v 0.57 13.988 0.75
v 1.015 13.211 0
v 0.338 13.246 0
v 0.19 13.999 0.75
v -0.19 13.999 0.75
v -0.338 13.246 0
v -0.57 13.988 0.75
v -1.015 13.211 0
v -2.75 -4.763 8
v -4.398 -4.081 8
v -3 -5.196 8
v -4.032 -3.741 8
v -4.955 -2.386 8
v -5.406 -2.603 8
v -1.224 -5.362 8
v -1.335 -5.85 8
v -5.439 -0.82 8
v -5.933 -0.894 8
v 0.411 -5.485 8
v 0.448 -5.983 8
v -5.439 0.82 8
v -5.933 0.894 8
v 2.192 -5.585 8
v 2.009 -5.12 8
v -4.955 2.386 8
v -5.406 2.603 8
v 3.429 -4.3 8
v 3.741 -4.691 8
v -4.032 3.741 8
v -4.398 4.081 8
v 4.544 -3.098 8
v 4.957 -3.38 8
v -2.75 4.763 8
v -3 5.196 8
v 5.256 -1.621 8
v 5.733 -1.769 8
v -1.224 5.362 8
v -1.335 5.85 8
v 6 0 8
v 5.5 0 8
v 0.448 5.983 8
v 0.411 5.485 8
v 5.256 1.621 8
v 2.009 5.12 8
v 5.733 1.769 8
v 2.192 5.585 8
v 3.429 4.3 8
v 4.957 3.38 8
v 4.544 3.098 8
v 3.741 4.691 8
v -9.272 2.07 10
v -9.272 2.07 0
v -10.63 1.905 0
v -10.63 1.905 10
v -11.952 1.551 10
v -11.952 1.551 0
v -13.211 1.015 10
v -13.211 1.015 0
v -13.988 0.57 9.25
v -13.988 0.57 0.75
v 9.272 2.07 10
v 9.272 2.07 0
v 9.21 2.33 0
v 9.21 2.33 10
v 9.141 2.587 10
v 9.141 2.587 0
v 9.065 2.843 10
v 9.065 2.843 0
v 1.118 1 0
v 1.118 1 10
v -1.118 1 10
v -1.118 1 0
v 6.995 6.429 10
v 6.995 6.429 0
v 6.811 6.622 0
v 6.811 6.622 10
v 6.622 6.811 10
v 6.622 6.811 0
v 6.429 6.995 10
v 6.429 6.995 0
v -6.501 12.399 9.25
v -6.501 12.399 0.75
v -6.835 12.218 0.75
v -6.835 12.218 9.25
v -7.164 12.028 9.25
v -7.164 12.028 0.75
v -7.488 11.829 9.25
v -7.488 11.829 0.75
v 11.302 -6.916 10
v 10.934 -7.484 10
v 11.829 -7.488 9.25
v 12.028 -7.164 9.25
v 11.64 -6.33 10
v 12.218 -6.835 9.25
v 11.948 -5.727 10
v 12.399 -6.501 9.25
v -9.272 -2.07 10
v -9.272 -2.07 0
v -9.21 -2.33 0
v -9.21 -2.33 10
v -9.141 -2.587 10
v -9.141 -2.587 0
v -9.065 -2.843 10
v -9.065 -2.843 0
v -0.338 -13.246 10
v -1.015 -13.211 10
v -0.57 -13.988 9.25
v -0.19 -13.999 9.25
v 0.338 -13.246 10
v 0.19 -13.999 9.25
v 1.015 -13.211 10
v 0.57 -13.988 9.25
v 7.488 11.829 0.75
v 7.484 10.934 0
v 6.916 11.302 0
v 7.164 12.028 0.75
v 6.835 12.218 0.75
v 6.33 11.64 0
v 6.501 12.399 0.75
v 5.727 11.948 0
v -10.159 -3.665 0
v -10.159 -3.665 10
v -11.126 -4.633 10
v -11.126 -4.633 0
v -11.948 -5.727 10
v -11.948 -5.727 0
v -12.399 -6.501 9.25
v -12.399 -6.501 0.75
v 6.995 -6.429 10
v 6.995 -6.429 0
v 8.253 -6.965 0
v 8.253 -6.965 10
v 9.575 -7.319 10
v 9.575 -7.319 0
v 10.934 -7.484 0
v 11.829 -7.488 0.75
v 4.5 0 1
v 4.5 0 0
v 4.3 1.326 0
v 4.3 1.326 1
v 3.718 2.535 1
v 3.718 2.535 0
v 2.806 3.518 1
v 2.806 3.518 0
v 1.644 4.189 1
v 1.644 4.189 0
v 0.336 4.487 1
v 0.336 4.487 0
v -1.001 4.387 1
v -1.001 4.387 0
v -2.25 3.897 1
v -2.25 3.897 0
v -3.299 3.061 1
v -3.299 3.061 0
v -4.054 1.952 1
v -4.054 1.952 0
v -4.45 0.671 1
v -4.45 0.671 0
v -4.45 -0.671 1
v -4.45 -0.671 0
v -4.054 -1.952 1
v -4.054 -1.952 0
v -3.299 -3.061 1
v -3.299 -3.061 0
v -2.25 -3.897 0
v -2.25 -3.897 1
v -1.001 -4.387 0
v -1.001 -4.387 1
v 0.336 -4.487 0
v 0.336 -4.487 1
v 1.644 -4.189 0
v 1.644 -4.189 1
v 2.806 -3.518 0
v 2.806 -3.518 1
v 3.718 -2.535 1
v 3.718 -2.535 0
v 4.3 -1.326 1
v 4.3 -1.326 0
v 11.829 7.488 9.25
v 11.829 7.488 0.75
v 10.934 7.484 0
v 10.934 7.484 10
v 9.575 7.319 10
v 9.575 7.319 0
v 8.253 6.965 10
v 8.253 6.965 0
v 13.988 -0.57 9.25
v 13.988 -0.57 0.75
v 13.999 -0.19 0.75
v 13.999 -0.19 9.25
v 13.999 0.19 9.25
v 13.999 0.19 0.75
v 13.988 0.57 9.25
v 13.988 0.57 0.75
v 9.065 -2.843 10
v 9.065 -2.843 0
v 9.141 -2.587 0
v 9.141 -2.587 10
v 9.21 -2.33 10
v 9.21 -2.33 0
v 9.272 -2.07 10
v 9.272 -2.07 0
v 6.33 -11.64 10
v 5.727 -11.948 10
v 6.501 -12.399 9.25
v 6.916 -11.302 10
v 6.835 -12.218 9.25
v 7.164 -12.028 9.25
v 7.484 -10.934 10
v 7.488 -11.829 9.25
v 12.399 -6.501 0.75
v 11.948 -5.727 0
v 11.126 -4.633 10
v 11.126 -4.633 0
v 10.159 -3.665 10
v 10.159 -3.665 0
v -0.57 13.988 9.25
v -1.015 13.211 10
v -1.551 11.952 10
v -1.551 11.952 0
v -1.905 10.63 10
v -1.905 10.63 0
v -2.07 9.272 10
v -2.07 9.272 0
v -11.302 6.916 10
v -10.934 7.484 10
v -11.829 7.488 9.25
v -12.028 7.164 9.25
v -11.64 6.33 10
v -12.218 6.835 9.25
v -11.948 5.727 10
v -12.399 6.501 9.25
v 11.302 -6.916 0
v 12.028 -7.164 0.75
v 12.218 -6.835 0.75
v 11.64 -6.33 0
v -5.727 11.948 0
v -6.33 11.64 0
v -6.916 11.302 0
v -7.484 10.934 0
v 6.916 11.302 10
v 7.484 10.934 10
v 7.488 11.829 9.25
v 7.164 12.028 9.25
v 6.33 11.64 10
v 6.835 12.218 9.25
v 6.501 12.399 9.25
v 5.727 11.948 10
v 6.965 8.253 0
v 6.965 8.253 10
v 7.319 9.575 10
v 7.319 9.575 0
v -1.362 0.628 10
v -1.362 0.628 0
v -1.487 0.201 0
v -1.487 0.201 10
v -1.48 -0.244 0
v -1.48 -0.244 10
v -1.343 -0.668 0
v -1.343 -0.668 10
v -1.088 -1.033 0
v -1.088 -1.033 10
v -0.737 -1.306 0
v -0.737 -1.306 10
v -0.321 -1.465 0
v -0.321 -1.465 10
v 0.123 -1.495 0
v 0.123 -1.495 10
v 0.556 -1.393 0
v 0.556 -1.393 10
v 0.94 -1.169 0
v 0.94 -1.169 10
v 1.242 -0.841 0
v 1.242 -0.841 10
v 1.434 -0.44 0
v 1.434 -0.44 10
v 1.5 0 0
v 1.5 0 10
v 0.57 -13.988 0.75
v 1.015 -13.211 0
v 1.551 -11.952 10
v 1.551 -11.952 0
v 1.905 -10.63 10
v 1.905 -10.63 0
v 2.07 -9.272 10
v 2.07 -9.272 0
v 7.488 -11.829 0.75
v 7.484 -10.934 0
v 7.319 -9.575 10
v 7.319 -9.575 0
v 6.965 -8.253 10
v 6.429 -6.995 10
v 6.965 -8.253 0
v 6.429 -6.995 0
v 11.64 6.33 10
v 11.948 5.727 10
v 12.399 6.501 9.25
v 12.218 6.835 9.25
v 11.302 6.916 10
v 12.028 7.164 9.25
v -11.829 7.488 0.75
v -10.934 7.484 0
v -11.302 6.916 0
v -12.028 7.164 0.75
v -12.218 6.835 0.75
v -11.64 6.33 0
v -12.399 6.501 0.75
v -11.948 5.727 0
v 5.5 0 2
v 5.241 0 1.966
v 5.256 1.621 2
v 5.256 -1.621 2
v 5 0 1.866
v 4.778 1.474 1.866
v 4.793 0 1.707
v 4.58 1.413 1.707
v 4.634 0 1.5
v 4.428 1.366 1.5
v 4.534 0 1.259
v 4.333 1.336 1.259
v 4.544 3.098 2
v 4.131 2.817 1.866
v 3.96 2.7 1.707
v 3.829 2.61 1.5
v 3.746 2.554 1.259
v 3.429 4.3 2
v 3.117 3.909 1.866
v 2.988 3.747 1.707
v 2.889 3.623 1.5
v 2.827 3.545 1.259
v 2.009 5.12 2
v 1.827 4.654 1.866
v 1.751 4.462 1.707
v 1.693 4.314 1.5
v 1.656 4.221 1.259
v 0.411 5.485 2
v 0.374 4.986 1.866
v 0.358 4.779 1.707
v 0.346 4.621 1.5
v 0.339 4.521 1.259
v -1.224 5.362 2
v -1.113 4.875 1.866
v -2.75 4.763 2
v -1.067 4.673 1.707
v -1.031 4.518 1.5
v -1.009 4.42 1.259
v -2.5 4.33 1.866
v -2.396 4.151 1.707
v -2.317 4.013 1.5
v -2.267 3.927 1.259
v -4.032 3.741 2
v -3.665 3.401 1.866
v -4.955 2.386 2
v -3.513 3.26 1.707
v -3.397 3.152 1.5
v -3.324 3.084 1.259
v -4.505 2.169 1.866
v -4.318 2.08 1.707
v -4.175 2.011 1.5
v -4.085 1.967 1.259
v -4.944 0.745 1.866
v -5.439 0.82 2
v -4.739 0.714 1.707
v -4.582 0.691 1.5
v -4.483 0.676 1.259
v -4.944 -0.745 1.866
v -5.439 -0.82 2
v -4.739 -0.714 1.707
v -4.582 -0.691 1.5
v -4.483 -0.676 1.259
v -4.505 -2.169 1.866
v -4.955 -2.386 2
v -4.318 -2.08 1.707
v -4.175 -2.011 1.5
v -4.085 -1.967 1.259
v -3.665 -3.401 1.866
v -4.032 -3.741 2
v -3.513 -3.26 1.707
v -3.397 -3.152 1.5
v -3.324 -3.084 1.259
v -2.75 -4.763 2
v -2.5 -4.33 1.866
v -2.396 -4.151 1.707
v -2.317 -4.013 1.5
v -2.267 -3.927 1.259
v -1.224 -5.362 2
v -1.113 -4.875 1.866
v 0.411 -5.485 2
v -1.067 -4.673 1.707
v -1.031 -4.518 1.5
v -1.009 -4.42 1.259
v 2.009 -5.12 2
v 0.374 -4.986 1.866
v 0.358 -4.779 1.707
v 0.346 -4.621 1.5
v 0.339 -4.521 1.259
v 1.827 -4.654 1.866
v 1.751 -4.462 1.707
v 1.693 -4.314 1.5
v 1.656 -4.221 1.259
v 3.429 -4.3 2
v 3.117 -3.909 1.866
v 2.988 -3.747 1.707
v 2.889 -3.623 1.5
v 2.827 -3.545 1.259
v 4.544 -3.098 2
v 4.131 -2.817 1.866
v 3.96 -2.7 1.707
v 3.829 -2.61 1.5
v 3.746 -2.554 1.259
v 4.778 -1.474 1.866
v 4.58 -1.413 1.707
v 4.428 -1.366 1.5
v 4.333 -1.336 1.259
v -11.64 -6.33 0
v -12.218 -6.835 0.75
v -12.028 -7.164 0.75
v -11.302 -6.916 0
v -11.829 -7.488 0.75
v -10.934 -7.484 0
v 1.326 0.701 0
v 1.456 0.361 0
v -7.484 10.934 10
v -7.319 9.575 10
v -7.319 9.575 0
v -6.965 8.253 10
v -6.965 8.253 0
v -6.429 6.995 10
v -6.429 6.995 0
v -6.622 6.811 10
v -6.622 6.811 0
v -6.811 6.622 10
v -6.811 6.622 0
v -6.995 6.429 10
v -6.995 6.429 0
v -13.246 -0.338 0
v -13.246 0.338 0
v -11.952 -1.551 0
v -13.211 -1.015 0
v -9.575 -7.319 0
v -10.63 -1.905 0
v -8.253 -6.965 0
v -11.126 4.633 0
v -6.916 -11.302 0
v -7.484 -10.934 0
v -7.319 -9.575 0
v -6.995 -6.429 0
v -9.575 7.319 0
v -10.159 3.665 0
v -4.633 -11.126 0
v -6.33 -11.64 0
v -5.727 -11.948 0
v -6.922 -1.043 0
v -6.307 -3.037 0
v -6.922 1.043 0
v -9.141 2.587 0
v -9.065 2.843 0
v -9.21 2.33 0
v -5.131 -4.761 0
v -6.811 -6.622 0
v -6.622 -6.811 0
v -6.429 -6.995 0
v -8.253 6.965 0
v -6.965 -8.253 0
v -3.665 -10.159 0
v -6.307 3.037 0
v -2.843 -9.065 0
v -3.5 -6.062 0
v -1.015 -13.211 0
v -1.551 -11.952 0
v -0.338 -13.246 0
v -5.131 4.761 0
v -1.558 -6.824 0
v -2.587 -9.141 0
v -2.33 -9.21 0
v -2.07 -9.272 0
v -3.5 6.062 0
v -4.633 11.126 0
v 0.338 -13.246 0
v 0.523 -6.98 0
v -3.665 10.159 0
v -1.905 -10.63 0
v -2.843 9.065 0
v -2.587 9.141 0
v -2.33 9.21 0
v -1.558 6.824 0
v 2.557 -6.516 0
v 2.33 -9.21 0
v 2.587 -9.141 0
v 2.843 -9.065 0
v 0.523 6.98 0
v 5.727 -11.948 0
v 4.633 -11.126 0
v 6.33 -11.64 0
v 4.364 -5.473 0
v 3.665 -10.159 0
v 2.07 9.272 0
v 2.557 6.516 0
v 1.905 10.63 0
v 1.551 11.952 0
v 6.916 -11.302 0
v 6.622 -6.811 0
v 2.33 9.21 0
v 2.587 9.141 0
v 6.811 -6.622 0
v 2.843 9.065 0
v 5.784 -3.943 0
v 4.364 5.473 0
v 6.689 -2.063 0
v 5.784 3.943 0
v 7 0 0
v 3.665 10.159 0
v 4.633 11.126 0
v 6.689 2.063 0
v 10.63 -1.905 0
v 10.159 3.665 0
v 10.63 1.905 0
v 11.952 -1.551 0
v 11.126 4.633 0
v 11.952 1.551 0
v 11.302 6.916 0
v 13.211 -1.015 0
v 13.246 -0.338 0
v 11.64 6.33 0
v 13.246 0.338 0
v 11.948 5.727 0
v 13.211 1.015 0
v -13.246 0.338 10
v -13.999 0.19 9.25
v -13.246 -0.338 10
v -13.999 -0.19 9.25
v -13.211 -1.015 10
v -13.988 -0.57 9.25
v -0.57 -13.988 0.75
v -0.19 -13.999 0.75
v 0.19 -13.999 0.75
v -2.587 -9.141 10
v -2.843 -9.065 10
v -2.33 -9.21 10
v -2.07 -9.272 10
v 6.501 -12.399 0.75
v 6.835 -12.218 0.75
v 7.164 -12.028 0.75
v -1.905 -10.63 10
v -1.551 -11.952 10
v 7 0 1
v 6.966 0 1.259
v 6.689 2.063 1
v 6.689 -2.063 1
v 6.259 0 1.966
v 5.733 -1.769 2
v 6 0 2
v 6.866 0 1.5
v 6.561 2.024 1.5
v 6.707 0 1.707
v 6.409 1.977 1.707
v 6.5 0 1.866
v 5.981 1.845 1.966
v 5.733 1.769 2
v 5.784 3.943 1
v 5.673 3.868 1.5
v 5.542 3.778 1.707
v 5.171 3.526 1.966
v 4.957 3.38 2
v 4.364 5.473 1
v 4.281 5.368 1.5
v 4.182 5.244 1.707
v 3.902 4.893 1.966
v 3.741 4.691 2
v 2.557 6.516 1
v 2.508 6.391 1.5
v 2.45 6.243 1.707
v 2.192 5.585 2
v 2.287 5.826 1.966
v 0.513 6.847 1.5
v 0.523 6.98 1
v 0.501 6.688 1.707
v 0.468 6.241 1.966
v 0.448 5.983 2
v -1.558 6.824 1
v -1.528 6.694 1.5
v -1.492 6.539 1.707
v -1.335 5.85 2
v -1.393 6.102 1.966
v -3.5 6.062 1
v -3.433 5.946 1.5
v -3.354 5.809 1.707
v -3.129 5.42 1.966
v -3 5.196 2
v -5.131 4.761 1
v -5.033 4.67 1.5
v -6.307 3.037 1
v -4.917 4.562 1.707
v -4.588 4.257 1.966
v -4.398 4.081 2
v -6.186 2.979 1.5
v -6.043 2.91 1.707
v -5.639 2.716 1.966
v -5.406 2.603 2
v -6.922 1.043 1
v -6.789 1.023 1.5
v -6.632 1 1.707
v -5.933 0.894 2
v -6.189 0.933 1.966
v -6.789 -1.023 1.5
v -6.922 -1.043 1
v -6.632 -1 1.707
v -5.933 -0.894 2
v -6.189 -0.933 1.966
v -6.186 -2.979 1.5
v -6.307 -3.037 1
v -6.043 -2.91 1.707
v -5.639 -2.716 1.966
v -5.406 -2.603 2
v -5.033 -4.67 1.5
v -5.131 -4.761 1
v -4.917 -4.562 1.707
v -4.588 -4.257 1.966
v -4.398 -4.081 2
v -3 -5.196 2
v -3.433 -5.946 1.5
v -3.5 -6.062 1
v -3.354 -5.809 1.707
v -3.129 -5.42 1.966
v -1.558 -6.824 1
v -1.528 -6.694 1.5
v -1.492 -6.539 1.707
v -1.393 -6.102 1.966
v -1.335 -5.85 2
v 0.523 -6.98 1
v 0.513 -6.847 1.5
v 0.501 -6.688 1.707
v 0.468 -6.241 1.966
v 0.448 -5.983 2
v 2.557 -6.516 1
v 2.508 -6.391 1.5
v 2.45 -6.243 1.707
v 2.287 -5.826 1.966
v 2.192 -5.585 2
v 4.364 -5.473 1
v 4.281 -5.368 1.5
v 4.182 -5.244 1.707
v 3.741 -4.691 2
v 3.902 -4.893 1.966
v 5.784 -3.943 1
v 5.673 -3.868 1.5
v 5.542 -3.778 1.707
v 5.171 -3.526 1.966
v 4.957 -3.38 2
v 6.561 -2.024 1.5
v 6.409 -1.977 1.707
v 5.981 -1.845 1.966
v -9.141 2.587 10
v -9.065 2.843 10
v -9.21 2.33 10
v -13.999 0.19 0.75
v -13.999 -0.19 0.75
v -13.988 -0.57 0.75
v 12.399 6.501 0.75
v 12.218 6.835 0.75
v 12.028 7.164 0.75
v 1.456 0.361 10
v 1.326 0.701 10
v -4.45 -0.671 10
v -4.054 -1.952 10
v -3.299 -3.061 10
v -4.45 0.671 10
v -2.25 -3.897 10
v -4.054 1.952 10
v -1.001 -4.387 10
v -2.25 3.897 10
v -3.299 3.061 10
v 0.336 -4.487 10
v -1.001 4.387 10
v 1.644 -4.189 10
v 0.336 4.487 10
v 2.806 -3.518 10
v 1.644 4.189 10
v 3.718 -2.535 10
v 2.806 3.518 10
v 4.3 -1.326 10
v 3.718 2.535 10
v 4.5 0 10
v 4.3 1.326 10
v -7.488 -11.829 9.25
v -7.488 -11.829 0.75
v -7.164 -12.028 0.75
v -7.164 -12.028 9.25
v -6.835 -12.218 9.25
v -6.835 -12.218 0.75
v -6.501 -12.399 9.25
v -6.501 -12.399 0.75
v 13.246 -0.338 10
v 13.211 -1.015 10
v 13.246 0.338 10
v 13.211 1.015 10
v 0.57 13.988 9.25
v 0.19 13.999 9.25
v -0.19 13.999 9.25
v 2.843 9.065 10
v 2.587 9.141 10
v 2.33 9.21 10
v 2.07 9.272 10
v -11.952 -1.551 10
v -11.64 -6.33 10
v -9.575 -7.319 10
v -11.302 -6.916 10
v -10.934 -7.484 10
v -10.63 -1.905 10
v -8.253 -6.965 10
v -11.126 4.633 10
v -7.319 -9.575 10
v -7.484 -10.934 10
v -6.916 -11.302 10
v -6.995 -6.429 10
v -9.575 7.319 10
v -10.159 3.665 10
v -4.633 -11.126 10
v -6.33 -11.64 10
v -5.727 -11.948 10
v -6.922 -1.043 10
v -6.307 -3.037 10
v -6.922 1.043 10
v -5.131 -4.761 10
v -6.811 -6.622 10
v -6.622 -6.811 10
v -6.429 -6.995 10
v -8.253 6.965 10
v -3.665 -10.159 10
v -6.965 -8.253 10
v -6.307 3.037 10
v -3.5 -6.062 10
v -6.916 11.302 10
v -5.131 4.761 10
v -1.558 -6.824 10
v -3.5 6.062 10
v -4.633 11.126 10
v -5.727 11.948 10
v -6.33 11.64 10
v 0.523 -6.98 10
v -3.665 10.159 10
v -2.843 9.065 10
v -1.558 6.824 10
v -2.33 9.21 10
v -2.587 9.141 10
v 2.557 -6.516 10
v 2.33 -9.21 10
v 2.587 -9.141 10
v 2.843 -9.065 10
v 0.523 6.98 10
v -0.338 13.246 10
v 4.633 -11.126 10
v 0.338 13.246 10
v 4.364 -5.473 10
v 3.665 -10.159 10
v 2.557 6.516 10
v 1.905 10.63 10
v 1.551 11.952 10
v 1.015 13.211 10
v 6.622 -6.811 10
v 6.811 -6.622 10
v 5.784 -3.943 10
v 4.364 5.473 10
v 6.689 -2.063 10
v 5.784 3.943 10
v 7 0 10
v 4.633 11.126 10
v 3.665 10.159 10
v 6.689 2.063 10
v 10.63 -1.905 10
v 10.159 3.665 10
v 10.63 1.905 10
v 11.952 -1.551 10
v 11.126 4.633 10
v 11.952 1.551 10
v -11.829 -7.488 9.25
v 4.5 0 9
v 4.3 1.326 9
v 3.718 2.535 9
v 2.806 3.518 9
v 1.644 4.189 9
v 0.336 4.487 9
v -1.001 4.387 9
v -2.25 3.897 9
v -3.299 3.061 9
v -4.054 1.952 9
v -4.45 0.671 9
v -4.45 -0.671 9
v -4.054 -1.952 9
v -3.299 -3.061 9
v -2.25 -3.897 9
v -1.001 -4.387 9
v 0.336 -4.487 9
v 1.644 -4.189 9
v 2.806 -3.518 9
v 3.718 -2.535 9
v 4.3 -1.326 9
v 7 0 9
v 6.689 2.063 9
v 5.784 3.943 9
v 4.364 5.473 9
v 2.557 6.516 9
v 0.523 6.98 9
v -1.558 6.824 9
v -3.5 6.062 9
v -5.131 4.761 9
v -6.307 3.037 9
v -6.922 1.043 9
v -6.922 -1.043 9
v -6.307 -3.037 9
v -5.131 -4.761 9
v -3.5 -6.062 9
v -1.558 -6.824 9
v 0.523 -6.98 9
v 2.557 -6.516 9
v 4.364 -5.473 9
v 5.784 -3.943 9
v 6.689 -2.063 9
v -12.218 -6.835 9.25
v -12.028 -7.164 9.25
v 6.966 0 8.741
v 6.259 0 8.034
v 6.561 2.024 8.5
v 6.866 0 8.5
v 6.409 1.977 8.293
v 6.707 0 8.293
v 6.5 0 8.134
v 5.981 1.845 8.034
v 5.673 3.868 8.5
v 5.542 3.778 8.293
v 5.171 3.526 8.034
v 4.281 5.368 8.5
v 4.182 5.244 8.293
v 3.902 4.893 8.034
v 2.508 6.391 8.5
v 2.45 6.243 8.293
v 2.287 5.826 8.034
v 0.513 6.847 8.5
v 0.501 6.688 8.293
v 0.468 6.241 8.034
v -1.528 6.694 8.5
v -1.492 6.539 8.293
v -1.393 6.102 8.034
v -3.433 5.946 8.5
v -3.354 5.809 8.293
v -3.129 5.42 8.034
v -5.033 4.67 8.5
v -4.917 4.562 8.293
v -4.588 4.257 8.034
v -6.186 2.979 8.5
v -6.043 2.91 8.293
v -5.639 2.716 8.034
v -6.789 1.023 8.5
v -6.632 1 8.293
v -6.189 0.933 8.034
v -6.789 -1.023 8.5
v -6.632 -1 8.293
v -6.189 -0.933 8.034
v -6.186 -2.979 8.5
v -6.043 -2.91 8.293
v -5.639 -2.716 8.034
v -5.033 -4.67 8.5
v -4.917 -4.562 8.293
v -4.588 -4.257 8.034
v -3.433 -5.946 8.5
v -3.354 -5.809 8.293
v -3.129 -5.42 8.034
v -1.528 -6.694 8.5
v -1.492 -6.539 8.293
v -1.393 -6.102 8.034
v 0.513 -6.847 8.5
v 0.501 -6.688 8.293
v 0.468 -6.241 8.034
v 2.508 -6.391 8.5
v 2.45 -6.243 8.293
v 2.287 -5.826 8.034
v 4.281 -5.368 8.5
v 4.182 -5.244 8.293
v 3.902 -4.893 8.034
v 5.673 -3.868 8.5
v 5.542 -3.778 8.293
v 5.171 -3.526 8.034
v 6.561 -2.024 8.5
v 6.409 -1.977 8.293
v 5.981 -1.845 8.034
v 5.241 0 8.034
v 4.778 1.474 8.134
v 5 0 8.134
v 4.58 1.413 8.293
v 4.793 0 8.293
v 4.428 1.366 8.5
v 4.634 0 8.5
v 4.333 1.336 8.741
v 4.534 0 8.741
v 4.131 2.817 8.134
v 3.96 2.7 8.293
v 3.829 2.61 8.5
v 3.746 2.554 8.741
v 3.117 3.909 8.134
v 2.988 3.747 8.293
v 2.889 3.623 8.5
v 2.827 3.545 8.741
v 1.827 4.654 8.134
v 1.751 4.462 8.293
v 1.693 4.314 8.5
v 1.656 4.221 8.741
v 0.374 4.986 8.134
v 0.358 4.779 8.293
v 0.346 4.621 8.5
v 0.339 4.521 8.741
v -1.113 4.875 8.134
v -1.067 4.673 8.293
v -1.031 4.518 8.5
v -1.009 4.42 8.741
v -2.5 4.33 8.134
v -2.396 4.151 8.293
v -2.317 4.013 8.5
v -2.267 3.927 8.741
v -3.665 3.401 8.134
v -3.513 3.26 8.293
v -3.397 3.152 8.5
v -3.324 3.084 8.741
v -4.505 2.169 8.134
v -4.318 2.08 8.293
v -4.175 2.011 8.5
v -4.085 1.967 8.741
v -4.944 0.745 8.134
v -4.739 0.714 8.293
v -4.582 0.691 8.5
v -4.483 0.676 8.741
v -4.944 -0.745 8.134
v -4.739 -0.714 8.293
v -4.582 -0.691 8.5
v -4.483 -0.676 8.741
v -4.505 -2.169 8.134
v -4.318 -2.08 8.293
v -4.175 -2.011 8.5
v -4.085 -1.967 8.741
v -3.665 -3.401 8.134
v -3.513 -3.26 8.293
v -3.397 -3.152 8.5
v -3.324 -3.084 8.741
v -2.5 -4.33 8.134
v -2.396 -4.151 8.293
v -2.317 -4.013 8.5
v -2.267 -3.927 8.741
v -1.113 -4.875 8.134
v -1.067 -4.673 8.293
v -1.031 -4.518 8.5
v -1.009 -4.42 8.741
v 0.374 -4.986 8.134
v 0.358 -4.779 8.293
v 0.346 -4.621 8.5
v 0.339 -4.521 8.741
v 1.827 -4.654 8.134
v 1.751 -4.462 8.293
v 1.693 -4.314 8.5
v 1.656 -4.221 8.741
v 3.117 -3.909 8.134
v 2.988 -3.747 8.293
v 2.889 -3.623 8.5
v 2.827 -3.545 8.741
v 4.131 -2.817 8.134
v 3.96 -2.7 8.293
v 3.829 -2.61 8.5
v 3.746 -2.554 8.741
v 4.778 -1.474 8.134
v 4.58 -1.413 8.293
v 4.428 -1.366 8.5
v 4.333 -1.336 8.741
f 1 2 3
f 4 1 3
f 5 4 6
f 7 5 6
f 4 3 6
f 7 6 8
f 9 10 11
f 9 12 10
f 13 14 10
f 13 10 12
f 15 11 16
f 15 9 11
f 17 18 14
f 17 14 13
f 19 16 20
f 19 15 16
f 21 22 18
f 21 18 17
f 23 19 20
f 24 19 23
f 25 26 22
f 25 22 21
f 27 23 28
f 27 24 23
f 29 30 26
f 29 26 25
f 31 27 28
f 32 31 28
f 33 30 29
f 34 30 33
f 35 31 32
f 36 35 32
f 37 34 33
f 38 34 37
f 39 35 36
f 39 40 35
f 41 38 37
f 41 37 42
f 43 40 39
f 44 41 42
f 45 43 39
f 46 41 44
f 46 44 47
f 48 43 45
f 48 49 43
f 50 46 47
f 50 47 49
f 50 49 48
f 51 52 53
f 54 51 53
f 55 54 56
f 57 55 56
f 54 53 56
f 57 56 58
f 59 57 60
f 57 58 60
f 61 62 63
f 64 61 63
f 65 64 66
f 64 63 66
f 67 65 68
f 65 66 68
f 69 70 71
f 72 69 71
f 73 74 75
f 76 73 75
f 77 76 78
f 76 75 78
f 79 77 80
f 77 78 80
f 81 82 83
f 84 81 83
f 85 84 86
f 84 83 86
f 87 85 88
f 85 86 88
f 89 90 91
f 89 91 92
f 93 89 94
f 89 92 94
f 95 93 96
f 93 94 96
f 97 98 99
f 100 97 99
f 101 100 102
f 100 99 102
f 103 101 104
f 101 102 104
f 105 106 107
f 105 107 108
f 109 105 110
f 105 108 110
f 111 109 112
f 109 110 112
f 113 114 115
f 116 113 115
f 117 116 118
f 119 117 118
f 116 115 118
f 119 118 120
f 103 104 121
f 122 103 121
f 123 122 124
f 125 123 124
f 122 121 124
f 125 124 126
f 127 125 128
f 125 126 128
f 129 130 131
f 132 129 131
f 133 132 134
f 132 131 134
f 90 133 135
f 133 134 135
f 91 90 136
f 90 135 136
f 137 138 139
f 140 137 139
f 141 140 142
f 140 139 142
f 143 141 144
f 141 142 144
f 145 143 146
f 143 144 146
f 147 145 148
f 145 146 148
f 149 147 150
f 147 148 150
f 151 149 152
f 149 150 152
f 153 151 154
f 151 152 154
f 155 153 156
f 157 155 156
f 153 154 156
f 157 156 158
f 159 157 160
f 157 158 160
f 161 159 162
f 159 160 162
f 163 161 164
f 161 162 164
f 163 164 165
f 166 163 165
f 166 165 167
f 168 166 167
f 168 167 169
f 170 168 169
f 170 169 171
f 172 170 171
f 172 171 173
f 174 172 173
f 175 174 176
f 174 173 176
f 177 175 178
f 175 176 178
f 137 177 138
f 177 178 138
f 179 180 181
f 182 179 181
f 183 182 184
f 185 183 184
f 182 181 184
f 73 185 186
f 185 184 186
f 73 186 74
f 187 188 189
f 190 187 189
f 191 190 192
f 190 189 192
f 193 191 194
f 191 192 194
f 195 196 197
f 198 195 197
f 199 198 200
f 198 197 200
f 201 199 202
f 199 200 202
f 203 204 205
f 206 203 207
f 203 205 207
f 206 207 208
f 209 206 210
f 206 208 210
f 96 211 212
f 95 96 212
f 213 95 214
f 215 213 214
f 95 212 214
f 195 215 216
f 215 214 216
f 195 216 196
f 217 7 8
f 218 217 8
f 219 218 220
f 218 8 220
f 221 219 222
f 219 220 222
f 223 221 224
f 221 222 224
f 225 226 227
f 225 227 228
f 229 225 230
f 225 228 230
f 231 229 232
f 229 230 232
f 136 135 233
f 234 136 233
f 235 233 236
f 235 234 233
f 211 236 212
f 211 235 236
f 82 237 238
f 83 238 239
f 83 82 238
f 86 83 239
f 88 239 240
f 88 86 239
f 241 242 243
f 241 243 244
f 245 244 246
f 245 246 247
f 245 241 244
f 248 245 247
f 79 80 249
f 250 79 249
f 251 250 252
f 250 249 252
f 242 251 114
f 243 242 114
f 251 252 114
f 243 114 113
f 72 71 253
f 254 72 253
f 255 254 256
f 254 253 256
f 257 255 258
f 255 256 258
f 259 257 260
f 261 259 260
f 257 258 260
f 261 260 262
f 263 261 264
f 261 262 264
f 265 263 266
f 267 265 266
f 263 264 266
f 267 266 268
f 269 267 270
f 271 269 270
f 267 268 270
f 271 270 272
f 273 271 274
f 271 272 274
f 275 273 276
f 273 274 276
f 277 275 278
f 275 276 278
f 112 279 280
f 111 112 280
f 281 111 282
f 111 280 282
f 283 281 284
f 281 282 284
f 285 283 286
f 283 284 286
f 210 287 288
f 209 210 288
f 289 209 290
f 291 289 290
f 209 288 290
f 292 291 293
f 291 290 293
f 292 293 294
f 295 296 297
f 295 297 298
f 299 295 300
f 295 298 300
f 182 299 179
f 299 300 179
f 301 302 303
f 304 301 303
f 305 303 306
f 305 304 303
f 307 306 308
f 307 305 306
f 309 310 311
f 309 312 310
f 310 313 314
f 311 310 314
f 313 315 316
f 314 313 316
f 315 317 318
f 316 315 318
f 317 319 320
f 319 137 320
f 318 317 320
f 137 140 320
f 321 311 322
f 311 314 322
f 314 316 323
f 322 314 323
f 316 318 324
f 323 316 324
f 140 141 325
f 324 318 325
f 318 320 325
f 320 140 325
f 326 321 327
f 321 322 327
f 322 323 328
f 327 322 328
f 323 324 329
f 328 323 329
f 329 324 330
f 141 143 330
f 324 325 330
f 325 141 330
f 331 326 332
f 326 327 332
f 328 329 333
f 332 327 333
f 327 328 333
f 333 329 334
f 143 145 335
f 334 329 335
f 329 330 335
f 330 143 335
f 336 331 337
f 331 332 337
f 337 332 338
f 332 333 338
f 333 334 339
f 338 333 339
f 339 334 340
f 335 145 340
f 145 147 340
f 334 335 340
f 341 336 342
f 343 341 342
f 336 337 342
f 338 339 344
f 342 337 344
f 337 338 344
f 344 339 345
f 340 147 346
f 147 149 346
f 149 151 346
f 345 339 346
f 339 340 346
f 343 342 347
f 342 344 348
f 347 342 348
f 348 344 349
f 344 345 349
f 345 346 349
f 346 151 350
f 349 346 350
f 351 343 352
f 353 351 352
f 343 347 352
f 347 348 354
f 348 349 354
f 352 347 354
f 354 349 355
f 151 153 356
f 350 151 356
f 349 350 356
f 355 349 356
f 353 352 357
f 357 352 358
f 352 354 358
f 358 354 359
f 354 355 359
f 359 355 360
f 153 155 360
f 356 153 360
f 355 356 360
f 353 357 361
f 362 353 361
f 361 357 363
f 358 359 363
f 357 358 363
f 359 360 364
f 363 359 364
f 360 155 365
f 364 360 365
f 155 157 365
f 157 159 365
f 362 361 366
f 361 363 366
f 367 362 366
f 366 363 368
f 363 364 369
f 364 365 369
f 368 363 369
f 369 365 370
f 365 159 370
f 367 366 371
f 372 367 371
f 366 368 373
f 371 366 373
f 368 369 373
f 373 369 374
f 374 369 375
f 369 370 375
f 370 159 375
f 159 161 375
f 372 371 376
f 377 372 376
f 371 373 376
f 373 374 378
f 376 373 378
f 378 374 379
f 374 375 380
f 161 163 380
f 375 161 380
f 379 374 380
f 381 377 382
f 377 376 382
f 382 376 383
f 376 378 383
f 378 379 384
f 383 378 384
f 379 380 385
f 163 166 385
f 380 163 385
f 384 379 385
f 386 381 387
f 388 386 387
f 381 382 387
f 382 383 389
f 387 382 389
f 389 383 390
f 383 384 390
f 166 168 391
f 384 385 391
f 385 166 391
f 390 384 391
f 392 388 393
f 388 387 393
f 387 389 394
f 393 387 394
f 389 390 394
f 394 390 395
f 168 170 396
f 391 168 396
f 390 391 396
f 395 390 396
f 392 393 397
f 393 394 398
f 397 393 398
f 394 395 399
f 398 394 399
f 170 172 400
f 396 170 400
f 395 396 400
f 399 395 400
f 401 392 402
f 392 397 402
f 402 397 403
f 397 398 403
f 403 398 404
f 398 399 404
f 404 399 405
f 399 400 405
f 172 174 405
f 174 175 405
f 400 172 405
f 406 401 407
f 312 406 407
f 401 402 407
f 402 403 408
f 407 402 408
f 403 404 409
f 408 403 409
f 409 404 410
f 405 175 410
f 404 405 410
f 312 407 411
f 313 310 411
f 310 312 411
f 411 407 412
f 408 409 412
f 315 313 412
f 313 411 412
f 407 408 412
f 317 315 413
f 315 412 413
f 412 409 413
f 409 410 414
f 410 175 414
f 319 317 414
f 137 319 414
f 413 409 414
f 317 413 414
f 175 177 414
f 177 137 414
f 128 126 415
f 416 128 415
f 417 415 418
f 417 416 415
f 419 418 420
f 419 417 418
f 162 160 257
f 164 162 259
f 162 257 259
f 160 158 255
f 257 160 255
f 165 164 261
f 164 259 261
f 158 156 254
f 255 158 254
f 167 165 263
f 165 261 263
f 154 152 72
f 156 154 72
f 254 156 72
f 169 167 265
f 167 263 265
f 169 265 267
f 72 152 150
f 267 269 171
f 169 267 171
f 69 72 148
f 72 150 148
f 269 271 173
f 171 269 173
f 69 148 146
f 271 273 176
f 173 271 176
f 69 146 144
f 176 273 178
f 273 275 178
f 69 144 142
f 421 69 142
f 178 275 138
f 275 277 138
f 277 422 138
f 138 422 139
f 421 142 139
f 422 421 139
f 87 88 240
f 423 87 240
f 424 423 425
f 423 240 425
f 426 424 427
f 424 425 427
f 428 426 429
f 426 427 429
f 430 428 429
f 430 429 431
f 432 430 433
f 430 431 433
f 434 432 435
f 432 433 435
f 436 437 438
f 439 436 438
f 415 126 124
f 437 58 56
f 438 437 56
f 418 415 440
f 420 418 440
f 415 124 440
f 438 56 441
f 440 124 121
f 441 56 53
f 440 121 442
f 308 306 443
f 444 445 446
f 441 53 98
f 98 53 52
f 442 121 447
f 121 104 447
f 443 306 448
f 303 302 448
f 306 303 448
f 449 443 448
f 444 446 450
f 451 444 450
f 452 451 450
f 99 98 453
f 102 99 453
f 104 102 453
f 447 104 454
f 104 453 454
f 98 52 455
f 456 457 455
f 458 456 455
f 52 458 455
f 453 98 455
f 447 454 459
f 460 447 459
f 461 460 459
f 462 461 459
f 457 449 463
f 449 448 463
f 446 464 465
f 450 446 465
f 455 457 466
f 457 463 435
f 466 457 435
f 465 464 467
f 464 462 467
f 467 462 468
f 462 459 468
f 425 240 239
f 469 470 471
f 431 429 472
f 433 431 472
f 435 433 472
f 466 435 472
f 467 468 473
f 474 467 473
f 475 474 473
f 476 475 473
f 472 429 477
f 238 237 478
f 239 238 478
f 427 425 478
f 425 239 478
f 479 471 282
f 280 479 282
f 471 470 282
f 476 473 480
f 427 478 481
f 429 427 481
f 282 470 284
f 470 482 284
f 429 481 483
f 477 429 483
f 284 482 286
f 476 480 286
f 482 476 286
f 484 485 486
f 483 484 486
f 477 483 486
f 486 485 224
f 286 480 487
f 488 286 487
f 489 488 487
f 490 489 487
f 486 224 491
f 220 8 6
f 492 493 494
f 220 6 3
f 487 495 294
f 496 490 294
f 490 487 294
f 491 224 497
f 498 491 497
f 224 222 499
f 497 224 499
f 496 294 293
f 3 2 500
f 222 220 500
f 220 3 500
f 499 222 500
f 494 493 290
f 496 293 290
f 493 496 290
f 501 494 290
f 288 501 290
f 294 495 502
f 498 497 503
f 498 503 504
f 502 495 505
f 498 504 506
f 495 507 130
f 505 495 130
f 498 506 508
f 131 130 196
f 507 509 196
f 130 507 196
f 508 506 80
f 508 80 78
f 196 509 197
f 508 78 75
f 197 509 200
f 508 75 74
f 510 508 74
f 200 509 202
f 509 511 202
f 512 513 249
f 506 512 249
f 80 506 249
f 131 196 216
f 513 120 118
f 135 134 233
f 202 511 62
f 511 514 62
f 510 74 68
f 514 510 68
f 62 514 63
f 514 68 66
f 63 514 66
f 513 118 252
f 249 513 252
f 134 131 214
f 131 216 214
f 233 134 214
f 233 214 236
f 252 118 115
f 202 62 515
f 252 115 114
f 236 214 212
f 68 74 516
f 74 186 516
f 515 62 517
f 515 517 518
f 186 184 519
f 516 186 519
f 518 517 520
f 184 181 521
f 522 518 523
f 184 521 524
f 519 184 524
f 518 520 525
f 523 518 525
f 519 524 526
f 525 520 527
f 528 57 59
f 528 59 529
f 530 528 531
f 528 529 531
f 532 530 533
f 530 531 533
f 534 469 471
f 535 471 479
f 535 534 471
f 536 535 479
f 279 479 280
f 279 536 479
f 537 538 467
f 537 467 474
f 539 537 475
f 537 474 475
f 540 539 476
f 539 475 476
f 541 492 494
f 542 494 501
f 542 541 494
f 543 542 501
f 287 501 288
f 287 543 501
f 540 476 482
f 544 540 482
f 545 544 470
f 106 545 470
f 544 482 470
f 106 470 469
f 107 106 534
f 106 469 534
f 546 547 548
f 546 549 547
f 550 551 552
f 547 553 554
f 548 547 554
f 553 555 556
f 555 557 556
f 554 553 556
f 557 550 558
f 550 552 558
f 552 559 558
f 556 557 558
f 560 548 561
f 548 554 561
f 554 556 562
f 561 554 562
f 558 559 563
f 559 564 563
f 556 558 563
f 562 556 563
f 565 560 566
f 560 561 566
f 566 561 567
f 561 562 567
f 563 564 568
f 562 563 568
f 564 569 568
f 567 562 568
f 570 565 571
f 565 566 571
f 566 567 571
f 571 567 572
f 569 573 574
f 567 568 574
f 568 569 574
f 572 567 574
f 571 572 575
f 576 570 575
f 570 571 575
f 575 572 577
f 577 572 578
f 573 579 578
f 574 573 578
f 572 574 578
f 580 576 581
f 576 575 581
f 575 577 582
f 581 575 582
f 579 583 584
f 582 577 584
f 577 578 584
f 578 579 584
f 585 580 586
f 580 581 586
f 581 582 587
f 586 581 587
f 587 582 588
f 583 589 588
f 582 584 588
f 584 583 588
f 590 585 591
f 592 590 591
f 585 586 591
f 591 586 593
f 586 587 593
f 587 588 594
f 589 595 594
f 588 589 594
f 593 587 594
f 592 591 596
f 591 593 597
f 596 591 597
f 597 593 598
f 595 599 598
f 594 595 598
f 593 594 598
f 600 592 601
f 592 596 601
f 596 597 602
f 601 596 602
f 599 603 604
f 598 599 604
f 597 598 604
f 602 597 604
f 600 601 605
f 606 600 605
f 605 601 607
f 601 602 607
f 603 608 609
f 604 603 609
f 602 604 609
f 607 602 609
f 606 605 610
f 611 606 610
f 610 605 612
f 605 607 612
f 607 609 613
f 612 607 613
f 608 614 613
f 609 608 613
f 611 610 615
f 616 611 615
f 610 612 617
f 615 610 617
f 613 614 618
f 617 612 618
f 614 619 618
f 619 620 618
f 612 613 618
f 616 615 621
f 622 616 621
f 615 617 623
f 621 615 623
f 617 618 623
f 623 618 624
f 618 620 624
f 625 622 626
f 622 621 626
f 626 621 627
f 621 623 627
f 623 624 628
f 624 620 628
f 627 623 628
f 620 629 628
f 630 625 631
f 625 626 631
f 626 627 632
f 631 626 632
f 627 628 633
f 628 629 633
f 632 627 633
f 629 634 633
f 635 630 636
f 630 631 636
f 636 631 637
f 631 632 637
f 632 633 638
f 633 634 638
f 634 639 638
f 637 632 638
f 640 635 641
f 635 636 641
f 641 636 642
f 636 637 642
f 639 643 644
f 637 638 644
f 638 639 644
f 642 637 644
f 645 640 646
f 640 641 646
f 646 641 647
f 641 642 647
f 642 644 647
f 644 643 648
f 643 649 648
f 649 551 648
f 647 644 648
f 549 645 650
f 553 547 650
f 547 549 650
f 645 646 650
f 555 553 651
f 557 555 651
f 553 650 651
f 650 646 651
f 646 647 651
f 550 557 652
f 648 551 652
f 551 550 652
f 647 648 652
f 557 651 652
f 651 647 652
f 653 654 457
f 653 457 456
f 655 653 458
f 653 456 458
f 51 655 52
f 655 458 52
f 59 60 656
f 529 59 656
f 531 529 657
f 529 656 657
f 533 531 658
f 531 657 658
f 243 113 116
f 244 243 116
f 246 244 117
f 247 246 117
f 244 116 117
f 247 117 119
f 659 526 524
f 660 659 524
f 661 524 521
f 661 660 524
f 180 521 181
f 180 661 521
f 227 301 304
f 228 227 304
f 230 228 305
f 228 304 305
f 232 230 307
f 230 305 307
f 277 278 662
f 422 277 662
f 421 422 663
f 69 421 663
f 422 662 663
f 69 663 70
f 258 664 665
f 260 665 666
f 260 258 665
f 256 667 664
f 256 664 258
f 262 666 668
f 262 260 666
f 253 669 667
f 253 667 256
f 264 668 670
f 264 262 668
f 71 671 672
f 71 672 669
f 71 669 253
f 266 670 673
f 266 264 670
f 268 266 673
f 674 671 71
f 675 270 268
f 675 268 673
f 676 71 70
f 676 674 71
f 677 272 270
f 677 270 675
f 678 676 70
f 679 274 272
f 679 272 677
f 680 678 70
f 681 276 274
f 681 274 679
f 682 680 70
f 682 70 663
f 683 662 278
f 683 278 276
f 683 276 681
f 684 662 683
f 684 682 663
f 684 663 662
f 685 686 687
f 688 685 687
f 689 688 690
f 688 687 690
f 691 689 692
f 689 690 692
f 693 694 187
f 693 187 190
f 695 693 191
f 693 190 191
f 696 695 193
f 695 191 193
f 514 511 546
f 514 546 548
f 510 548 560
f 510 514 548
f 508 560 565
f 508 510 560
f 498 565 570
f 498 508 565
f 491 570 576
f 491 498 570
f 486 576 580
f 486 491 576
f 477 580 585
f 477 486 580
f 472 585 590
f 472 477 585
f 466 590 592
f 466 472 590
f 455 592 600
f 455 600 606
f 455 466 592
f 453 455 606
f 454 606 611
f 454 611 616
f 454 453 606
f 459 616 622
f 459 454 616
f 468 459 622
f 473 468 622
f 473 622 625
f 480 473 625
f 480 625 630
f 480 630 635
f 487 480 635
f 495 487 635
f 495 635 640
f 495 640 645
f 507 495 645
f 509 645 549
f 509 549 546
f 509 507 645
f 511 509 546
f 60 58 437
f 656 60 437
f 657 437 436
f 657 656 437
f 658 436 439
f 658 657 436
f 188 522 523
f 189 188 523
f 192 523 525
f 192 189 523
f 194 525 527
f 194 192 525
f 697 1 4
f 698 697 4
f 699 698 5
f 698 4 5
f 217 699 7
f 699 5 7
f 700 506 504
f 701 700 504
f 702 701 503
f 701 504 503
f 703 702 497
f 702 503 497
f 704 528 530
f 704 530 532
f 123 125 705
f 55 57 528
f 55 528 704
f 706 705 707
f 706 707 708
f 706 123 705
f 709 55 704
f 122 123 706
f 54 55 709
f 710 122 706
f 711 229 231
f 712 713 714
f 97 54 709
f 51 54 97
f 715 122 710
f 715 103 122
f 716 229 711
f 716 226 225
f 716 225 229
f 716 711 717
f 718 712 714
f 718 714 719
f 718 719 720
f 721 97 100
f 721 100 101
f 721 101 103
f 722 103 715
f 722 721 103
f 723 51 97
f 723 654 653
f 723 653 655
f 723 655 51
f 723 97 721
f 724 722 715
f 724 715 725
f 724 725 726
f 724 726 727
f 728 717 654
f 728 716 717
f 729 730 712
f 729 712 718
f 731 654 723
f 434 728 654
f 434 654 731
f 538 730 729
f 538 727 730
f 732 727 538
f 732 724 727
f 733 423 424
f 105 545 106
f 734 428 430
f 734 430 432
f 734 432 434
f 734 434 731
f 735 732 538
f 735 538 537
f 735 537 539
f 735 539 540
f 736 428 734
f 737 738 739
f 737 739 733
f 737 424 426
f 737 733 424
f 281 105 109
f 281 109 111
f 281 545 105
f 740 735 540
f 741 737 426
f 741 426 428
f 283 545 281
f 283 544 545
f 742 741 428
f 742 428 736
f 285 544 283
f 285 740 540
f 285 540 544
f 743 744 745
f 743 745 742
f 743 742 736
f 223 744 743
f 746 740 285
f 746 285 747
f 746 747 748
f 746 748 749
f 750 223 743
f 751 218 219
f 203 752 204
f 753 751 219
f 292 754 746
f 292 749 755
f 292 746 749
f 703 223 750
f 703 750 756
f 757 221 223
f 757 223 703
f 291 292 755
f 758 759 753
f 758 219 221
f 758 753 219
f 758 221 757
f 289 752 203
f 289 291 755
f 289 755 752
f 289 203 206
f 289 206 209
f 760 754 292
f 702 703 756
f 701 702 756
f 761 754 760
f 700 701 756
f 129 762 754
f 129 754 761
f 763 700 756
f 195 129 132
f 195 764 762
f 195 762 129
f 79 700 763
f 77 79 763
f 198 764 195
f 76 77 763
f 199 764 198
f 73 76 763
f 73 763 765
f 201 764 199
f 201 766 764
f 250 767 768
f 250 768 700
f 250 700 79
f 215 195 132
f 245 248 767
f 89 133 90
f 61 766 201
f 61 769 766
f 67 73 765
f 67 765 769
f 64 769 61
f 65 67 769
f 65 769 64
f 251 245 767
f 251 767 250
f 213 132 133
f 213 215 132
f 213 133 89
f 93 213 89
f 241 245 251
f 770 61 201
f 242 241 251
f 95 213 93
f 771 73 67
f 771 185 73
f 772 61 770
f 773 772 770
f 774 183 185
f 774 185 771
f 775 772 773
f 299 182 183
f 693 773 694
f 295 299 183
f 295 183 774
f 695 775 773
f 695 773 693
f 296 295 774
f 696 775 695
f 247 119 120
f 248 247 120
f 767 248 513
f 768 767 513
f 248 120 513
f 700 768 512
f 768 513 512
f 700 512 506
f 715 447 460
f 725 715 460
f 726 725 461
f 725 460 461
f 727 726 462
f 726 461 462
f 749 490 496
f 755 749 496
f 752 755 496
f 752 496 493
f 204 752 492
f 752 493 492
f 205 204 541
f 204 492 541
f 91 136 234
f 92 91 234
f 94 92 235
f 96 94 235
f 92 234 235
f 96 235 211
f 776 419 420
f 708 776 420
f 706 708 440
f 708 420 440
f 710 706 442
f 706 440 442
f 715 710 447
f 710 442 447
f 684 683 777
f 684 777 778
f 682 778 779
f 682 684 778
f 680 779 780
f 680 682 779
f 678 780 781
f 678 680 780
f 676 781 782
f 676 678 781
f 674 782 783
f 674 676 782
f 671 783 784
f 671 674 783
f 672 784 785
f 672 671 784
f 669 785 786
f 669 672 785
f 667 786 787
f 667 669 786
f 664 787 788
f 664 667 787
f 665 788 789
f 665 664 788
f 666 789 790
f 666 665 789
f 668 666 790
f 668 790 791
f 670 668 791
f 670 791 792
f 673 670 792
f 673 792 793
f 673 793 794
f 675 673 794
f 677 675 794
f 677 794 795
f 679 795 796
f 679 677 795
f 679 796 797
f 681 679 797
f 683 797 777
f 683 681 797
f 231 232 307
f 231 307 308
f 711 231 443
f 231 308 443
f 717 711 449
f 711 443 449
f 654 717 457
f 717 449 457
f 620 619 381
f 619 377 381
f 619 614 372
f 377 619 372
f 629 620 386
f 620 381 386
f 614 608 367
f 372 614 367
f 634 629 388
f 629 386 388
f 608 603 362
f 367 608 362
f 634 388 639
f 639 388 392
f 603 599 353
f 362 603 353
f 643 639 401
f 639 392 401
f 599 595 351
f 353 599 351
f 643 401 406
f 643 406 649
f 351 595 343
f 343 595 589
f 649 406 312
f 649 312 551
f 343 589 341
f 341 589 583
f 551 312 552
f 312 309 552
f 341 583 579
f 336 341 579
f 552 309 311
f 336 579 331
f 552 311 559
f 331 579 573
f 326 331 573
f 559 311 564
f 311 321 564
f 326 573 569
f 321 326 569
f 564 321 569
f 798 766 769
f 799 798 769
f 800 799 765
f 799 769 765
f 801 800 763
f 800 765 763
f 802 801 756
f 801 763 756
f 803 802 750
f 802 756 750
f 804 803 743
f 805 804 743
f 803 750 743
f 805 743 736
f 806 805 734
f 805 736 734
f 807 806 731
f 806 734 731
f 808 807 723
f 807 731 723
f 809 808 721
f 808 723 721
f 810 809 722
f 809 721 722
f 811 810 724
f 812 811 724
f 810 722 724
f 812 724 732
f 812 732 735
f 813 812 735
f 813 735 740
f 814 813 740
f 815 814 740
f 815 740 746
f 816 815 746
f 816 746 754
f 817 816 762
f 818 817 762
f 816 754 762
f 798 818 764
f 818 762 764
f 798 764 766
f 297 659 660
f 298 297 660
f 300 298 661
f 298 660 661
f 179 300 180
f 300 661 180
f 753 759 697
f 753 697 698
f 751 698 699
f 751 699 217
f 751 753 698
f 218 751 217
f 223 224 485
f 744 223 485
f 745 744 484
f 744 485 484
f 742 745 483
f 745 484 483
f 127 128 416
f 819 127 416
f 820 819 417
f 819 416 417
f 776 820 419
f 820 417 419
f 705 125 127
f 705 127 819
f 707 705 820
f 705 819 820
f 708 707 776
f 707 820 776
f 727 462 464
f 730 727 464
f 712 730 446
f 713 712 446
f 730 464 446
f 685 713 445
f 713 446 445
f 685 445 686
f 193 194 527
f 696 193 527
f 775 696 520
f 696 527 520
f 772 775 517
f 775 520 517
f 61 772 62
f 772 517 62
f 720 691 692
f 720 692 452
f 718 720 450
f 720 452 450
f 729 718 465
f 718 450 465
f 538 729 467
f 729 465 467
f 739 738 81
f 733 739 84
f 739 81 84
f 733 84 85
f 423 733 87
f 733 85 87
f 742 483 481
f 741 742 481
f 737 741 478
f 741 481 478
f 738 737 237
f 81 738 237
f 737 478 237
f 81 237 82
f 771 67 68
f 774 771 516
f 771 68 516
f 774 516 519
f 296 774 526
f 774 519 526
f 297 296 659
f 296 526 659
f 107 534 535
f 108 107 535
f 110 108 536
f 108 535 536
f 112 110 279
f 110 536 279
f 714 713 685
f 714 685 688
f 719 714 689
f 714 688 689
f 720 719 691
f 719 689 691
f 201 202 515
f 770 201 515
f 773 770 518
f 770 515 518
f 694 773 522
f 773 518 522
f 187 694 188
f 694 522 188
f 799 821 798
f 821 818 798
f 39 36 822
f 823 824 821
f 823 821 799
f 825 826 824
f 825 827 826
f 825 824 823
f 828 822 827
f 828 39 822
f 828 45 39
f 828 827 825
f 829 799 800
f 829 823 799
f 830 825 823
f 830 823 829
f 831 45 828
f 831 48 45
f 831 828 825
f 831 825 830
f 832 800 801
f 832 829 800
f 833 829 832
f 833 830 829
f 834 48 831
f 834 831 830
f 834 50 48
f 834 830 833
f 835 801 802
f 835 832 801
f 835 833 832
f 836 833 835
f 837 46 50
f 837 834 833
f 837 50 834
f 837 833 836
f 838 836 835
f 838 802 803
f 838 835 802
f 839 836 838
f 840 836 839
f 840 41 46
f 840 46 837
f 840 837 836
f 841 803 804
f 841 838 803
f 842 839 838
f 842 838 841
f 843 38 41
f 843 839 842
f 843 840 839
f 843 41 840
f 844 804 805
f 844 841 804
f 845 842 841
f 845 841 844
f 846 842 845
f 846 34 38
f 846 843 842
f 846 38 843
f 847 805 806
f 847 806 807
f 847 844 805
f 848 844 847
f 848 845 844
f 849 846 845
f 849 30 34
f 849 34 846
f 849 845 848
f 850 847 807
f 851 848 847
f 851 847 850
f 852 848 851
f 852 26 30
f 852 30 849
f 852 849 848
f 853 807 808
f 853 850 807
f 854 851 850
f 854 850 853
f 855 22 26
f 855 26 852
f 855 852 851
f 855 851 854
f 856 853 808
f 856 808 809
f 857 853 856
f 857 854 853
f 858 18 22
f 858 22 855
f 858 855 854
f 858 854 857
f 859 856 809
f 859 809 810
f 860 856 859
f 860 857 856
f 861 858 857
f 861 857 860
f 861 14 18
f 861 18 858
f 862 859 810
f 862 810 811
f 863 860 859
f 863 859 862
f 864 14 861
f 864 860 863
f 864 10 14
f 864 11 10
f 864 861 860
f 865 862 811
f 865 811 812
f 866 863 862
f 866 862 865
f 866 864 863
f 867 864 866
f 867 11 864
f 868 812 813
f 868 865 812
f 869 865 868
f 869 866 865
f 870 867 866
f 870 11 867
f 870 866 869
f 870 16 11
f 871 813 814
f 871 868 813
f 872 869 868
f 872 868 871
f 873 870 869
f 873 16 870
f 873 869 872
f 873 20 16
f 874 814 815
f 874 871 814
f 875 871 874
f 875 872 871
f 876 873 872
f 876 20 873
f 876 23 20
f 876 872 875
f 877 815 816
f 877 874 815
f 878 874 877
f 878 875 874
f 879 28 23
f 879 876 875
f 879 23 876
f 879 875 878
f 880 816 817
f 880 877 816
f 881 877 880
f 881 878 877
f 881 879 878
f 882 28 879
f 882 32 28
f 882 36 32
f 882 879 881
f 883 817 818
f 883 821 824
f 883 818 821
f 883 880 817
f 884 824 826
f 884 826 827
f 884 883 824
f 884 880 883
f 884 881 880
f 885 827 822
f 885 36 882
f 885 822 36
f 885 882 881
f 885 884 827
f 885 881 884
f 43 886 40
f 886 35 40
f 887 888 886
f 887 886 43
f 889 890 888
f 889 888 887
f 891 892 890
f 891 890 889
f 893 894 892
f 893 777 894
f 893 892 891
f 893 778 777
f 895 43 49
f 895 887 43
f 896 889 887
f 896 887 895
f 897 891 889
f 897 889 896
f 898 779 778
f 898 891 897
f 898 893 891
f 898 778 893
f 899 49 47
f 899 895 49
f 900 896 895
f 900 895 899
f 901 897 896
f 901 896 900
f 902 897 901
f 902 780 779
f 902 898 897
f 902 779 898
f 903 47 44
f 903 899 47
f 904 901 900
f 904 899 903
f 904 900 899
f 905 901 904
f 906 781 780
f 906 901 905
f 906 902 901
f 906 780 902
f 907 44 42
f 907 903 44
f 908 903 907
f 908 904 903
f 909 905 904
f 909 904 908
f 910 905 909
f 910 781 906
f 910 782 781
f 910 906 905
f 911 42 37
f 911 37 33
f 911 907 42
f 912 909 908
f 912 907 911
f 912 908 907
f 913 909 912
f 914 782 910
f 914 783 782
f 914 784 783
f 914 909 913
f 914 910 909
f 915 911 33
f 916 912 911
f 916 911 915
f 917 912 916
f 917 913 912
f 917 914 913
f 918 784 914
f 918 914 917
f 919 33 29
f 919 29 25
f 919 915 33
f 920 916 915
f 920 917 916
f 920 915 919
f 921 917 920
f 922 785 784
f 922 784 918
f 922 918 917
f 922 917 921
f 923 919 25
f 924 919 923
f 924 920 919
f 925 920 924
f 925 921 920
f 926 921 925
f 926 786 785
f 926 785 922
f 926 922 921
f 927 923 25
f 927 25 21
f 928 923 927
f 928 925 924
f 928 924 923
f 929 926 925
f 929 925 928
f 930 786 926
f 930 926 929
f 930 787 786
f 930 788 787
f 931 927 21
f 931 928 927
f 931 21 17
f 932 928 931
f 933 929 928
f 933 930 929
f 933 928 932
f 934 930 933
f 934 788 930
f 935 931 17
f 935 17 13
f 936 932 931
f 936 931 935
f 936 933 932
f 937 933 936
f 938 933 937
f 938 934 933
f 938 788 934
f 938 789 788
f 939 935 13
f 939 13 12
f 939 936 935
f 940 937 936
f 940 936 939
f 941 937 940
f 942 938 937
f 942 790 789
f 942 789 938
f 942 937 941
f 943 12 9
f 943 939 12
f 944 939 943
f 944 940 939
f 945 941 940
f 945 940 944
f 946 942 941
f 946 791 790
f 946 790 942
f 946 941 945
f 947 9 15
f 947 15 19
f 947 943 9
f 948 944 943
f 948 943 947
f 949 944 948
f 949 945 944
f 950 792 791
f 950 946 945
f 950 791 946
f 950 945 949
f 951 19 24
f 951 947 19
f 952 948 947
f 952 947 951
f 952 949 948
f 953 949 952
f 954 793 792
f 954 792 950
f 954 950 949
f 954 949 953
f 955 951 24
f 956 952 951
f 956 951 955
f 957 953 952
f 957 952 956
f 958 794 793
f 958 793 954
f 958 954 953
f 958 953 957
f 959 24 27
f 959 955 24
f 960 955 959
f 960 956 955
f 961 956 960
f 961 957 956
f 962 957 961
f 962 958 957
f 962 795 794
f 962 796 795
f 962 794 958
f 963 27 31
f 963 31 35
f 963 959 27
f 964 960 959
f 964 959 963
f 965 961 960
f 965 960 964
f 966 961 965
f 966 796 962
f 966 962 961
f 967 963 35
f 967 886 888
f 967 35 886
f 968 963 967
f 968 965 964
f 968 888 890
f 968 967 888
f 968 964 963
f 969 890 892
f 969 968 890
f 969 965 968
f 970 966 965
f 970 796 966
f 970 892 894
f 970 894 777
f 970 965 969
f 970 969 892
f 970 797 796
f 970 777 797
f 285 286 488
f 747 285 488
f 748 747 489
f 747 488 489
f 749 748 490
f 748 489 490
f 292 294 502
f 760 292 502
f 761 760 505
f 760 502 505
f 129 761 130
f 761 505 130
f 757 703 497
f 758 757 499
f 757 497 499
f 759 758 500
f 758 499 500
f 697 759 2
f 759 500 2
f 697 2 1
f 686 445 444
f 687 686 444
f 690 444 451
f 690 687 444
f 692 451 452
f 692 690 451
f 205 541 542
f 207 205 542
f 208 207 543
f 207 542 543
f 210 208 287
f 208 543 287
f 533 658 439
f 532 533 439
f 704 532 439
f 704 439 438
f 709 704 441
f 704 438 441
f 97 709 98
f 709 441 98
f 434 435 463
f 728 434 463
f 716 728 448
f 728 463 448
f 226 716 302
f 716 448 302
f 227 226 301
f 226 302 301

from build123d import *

# Parameters (mm, degrees)
SKETCH1_R                    = 9.5
BOSS_EXTRUDE1_DEPTH          = 10
CHAMFER1_SIZE                = 0.75
CIRPATTERN1_COUNT            = 12
CHAMFER1_OF_CIRPATTERN1_SIZE = 0.75
SKETCH2_R                    = 7
SKETCH2_R_2                  = 4.5
CUT_EXTRUDE1_DEPTH           = 2
FILLET1_R                    = 1
FILLET1_OF_MIRROR1_R         = 1
CUT_EXTRUDE2_REACH           = 24.181


with BuildPart() as part:
    # Sketch1 → Boss-Extrude1 (new body)
    with BuildSketch(Plane.XY):
        Circle(SKETCH1_R)
        with BuildLine():
            ThreePointArc((-2.07, 9.271736623), (0, 9.5), (2.07, 9.271736623))
            ThreePointArc((2.07, 9.271736623), (1.625653209, 11.72726856), (0.57, 13.988391616))
            ThreePointArc((0.57, 13.988391616), (0, 14), (-0.57, 13.988391616))
            ThreePointArc((-0.57, 13.988391616), (-1.625653209, 11.72726856), (-2.07, 9.271736623))
        make_face()
    boss_extrude1 = extrude(amount=BOSS_EXTRUDE1_DEPTH)

    # Chamfer1
    chamfer1_edges = [part.edges().sort_by_distance(p)[0] for p in [
        (0, 14, 10),
        (0, 14, 0),
    ]]
    chamfer(chamfer1_edges, length=CHAMFER1_SIZE)

    # CirPattern1: Boss-Extrude1 ×12 about axis
    cirpattern1_axis = Axis((0, 0, 0), (0, 0, 1))
    for i in range(1, CIRPATTERN1_COUNT):
        add(boss_extrude1.rotate(cirpattern1_axis, i * 360 / CIRPATTERN1_COUNT))

    # Chamfer1 of CirPattern1
    chamfer1_of_cirpattern1_edges = [part.edges().sort_by_distance(p)[0] for p in [
        (-7, 12.124355653, 10),
        (-7, 12.124355653, 0),
        (-12.124355653, 7, 10),
        (-12.124355653, 7, 0),
        (-14, 0, 10),
        (-14, 0, 0),
        (-12.124355653, -7, 10),
        (-12.124355653, -7, 0),
        (-7, -12.124355653, 10),
        (-7, -12.124355653, 0),
        (0, -14, 10),
        (0, -14, 0),
        (7, -12.124355653, 10),
        (7, -12.124355653, 0),
        (12.124355653, -7, 10),
        (12.124355653, -7, 0),
        (14, 0, 10),
        (14, 0, 0),
        (12.124355653, 7, 10),
        (12.124355653, 7, 0),
        (7, 12.124355653, 10),
        (7, 12.124355653, 0),
    ]]
    chamfer(chamfer1_of_cirpattern1_edges, length=CHAMFER1_OF_CIRPATTERN1_SIZE)

    # Sketch2 → Cut-Extrude1 (cut)
    with BuildSketch(Plane.XY.offset(10)):
        Circle(SKETCH2_R)
        Circle(SKETCH2_R_2, mode=Mode.SUBTRACT)
    cut_extrude1 = extrude(amount=-CUT_EXTRUDE1_DEPTH, mode=Mode.SUBTRACT)

    # Fillet1
    fillet1_edges = [part.edges().sort_by_distance(p)[0] for p in [
        (-7, 0, 8),
        (-4.5, 0, 8),
    ]]
    fillet(fillet1_edges, radius=FILLET1_R)

    # Mirror1: Cut-Extrude1 across plane
    add(cut_extrude1.mirror(Plane.XY.offset(5)), mode=Mode.SUBTRACT)

    # Fillet1 of Mirror1
    fillet1_of_mirror1_edges = [part.edges().sort_by_distance(p)[0] for p in [
        (-7, 0, 2),
        (-4.5, 0, 2),
    ]]
    fillet(fillet1_of_mirror1_edges, radius=FILLET1_OF_MIRROR1_R)

    # Sketch3 → Cut-Extrude2 (cut, up to next)
    with BuildSketch(Plane.XY.offset(10), mode=Mode.PRIVATE) as cut_extrude2_sk1:
        with BuildLine():
            Line((1.118033989, 1), (-1.118033989, 1))
            ThreePointArc((-1.118033989, 1), (-0.535233135, -1.401258538), (1.5, 0))
            ThreePointArc((1.5, 0), (1.401258538, 0.535233135), (1.118033989, 1))
        make_face()
    cut_extrude2_tool1 = extrude(cut_extrude2_sk1.sketch, amount=-CUT_EXTRUDE2_REACH, mode=Mode.PRIVATE) & part.part
    add(cut_extrude2_tool1.solids().sort_by_distance((0, -0.148024, 10))[0], mode=Mode.SUBTRACT)


solid = part.part
